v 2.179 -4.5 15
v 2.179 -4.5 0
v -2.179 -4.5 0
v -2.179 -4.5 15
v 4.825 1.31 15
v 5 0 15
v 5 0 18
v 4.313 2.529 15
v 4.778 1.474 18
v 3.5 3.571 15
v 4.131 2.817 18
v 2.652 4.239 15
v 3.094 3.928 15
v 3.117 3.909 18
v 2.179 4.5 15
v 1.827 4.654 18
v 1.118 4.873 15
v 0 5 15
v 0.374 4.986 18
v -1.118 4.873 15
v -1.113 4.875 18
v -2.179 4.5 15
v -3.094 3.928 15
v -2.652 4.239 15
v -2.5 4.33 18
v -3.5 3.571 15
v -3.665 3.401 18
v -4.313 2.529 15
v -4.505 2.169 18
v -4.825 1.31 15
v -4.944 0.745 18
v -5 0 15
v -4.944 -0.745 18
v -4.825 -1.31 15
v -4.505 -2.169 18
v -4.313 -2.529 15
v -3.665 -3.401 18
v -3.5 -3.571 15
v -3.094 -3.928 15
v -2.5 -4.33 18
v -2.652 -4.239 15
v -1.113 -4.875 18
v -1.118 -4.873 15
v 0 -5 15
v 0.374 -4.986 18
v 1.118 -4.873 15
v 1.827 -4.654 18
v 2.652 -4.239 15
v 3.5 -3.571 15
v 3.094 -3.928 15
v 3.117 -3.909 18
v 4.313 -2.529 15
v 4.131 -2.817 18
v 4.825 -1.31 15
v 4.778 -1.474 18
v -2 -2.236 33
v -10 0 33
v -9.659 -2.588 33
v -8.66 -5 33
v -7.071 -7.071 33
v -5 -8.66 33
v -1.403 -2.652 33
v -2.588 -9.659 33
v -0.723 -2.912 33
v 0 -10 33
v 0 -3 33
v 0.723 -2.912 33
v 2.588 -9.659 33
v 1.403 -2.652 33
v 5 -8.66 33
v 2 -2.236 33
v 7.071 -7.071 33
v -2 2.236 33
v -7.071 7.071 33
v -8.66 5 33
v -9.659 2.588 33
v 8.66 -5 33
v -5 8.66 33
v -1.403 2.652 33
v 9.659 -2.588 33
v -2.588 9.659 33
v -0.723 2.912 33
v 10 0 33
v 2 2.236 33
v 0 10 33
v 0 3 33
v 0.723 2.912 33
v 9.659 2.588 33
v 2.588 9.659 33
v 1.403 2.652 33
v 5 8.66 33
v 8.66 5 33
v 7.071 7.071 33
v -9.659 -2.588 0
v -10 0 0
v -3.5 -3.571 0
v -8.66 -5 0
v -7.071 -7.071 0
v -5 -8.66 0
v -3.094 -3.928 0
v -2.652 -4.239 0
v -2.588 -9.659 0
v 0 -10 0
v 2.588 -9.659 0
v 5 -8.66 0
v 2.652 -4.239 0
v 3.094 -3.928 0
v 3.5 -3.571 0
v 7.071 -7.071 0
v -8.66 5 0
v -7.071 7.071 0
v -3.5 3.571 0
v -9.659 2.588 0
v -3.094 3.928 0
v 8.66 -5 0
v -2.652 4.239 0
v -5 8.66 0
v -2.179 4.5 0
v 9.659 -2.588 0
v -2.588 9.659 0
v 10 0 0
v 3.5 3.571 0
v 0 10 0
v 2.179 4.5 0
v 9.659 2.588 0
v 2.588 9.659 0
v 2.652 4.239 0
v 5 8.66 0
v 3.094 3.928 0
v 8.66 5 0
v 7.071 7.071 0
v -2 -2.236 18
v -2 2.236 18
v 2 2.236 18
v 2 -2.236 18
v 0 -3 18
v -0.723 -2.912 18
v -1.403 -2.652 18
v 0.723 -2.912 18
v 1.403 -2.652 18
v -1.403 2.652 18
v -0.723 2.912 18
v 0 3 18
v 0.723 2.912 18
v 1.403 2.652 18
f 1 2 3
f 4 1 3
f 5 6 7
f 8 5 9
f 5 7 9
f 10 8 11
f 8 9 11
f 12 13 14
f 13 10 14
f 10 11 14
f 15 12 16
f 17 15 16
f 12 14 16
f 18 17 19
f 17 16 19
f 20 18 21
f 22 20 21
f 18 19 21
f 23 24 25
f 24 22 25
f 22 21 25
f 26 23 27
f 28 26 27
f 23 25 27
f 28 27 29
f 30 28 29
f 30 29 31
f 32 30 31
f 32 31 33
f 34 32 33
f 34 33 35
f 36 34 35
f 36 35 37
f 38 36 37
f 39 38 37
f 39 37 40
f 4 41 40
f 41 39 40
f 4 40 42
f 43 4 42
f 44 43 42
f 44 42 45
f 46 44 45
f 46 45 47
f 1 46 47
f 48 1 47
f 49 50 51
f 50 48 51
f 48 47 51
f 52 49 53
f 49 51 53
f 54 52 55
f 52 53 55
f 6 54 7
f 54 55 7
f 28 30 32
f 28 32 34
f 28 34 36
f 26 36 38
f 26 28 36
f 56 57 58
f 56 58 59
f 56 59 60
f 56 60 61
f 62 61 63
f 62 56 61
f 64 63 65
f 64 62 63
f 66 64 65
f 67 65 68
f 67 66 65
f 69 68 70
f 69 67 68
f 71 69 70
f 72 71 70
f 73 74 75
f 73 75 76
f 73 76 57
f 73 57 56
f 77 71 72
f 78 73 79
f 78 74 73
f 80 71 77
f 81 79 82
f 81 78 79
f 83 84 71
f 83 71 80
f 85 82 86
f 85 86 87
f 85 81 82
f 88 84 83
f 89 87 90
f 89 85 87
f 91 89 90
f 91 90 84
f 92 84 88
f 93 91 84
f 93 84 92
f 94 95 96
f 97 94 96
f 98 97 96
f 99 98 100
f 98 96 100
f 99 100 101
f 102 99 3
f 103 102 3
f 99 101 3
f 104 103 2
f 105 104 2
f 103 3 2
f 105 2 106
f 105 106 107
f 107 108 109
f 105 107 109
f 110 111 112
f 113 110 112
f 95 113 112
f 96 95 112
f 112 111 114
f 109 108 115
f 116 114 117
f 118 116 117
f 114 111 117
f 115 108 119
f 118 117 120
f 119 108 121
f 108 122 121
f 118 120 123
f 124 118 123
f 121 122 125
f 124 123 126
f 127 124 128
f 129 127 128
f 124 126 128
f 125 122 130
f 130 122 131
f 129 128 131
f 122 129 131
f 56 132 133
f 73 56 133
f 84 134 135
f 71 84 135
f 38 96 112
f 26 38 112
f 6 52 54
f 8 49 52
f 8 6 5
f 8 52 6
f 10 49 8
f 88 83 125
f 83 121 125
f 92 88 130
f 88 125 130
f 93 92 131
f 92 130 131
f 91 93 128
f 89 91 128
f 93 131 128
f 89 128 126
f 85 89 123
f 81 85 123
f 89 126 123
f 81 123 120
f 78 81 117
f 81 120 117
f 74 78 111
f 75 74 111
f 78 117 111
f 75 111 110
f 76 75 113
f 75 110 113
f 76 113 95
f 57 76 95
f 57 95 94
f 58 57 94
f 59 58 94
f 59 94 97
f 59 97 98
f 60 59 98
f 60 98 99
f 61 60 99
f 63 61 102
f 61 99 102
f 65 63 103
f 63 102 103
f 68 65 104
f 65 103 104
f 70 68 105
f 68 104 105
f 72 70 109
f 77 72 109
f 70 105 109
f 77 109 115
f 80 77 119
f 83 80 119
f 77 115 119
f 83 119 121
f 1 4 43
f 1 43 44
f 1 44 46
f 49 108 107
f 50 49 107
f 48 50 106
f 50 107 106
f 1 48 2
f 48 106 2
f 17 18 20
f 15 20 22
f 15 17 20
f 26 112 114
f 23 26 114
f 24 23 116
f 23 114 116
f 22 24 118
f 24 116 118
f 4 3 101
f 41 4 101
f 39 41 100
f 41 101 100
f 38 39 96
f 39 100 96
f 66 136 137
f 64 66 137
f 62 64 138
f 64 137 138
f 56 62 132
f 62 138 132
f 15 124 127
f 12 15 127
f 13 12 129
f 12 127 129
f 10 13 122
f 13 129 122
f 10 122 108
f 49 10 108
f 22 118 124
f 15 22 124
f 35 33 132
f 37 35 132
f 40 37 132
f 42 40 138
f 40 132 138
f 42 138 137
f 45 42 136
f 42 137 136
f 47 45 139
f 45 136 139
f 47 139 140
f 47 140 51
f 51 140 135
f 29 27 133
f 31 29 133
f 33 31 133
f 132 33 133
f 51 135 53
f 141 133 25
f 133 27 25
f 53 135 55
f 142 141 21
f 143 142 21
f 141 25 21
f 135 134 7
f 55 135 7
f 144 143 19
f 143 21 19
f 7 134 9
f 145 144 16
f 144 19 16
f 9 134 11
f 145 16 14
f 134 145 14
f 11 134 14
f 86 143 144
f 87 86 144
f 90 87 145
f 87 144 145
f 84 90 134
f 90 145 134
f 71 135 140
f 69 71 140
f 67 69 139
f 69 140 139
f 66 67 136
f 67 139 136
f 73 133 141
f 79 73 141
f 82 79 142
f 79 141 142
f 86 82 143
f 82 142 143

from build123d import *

# Parameters (mm, degrees)
F0_R     = 10
F1_DEPTH = 18
F3_DEPTH = 15
F4_R     = 5
F5_DEPTH = 3
F6_R     = 10
F6_R_2   = 5
F7_DEPTH = 15


with BuildPart() as f1:
    # F0 (on Top) → F1 (new body)
    with BuildSketch(Plane.XY):
        Circle(F0_R)
    extrude(amount=F1_DEPTH)

    # F2 (on face) → F3 (cut)
    with BuildSketch(Plane(origin=(0, 0, 0), x_dir=(1, 0, 0), z_dir=(0, 0, -1))):
        with BuildLine():
            Line((3.5, -3.5707142143), (3.5, 3.5707142143))
            ThreePointArc((3.5, 3.5707142143), (2.87748668, 4.0890182693), (2.1794494718, 4.5))
            Line((2.1794494718, 4.5), (-2.1794494718, 4.5))
            ThreePointArc((-2.1794494718, 4.5), (-2.87748668, 4.0890182693), (-3.5, 3.5707142143))
            Line((-3.5, 3.5707142143), (-3.5, -3.5707142143))
            ThreePointArc((-3.5, -3.5707142143), (-2.87748668, -4.0890182693), (-2.1794494718, -4.5))
            Line((-2.1794494718, -4.5), (2.1794494718, -4.5))
            ThreePointArc((2.1794494718, -4.5), (2.87748668, -4.0890182693), (3.5, -3.5707142143))
        make_face()
    extrude(amount=-F3_DEPTH, mode=Mode.SUBTRACT)

    # F4 (on face) → F5 (cut)
    with BuildSketch(Plane.XY.offset(18)):
        Circle(F4_R)
    extrude(amount=-F5_DEPTH, mode=Mode.SUBTRACT)

    # F6 (on face) → F7 (join)
    with BuildSketch(Plane.XY.offset(18)):
        Circle(F6_R)
        Circle(F6_R_2, mode=Mode.SUBTRACT)
        Circle(F6_R_2)
        with BuildLine():
            ThreePointArc((2, 2.2360679775), (2.7386127875, 1.2247448714), (3, 0))
            ThreePointArc((3, 0), (2.7386127875, -1.2247448714), (2, -2.2360679775))
            Line((2, -2.2360679775), (2, -3))
            Line((2, -3), (0, -3))
            Line((0, -3), (-2, -3))
            Line((-2, -3), (-2, -2.2360679775))
            ThreePointArc((-2, -2.2360679775), (-3, 0), (-2, 2.2360679775))
            Line((-2, 2.2360679775), (-2, 3))
            Line((-2, 3), (0, 3))
            Line((0, 3), (2, 3))
            Line((2, 3), (2, 2.2360679775))
        make_face(mode=Mode.SUBTRACT)
        with BuildLine():
            ThreePointArc((2, -2.2360679775), (2.7386127875, -1.2247448714), (3, 0))
            ThreePointArc((3, 0), (2.7386127875, 1.2247448714), (2, 2.2360679775))
            Line((2, 2.2360679775), (2, -2.2360679775))
        make_face()
        with BuildLine():
            Line((2, -3), (2, -2.2360679775))
            ThreePointArc((2, -2.2360679775), (1.0704662693, -2.8025170769), (0, -3))
            Line((0, -3), (2, -3))
        make_face()
        with BuildLine():
            Line((-2, -3), (0, -3))
            ThreePointArc((0, -3), (-1.0704662693, -2.8025170769), (-2, -2.2360679775))
            Line((-2, -2.2360679775), (-2, -3))
        make_face()
        with BuildLine():
            Line((-2, -2.2360679775), (-2, 2.2360679775))
            ThreePointArc((-2, 2.2360679775), (-3, 0), (-2, -2.2360679775))
        make_face()
        with BuildLine():
            ThreePointArc((-2, 2.2360679775), (-1.0704662693, 2.8025170769), (0, 3))
            Line((0, 3), (-2, 3))
            Line((-2, 3), (-2, 2.2360679775))
        make_face()
        with BuildLine():
            ThreePointArc((0, 3), (1.0704662693, 2.8025170769), (2, 2.2360679775))
            Line((2, 2.2360679775), (2, 3))
            Line((2, 3), (0, 3))
        make_face()
    extrude(amount=F7_DEPTH)


solid = f1.part
